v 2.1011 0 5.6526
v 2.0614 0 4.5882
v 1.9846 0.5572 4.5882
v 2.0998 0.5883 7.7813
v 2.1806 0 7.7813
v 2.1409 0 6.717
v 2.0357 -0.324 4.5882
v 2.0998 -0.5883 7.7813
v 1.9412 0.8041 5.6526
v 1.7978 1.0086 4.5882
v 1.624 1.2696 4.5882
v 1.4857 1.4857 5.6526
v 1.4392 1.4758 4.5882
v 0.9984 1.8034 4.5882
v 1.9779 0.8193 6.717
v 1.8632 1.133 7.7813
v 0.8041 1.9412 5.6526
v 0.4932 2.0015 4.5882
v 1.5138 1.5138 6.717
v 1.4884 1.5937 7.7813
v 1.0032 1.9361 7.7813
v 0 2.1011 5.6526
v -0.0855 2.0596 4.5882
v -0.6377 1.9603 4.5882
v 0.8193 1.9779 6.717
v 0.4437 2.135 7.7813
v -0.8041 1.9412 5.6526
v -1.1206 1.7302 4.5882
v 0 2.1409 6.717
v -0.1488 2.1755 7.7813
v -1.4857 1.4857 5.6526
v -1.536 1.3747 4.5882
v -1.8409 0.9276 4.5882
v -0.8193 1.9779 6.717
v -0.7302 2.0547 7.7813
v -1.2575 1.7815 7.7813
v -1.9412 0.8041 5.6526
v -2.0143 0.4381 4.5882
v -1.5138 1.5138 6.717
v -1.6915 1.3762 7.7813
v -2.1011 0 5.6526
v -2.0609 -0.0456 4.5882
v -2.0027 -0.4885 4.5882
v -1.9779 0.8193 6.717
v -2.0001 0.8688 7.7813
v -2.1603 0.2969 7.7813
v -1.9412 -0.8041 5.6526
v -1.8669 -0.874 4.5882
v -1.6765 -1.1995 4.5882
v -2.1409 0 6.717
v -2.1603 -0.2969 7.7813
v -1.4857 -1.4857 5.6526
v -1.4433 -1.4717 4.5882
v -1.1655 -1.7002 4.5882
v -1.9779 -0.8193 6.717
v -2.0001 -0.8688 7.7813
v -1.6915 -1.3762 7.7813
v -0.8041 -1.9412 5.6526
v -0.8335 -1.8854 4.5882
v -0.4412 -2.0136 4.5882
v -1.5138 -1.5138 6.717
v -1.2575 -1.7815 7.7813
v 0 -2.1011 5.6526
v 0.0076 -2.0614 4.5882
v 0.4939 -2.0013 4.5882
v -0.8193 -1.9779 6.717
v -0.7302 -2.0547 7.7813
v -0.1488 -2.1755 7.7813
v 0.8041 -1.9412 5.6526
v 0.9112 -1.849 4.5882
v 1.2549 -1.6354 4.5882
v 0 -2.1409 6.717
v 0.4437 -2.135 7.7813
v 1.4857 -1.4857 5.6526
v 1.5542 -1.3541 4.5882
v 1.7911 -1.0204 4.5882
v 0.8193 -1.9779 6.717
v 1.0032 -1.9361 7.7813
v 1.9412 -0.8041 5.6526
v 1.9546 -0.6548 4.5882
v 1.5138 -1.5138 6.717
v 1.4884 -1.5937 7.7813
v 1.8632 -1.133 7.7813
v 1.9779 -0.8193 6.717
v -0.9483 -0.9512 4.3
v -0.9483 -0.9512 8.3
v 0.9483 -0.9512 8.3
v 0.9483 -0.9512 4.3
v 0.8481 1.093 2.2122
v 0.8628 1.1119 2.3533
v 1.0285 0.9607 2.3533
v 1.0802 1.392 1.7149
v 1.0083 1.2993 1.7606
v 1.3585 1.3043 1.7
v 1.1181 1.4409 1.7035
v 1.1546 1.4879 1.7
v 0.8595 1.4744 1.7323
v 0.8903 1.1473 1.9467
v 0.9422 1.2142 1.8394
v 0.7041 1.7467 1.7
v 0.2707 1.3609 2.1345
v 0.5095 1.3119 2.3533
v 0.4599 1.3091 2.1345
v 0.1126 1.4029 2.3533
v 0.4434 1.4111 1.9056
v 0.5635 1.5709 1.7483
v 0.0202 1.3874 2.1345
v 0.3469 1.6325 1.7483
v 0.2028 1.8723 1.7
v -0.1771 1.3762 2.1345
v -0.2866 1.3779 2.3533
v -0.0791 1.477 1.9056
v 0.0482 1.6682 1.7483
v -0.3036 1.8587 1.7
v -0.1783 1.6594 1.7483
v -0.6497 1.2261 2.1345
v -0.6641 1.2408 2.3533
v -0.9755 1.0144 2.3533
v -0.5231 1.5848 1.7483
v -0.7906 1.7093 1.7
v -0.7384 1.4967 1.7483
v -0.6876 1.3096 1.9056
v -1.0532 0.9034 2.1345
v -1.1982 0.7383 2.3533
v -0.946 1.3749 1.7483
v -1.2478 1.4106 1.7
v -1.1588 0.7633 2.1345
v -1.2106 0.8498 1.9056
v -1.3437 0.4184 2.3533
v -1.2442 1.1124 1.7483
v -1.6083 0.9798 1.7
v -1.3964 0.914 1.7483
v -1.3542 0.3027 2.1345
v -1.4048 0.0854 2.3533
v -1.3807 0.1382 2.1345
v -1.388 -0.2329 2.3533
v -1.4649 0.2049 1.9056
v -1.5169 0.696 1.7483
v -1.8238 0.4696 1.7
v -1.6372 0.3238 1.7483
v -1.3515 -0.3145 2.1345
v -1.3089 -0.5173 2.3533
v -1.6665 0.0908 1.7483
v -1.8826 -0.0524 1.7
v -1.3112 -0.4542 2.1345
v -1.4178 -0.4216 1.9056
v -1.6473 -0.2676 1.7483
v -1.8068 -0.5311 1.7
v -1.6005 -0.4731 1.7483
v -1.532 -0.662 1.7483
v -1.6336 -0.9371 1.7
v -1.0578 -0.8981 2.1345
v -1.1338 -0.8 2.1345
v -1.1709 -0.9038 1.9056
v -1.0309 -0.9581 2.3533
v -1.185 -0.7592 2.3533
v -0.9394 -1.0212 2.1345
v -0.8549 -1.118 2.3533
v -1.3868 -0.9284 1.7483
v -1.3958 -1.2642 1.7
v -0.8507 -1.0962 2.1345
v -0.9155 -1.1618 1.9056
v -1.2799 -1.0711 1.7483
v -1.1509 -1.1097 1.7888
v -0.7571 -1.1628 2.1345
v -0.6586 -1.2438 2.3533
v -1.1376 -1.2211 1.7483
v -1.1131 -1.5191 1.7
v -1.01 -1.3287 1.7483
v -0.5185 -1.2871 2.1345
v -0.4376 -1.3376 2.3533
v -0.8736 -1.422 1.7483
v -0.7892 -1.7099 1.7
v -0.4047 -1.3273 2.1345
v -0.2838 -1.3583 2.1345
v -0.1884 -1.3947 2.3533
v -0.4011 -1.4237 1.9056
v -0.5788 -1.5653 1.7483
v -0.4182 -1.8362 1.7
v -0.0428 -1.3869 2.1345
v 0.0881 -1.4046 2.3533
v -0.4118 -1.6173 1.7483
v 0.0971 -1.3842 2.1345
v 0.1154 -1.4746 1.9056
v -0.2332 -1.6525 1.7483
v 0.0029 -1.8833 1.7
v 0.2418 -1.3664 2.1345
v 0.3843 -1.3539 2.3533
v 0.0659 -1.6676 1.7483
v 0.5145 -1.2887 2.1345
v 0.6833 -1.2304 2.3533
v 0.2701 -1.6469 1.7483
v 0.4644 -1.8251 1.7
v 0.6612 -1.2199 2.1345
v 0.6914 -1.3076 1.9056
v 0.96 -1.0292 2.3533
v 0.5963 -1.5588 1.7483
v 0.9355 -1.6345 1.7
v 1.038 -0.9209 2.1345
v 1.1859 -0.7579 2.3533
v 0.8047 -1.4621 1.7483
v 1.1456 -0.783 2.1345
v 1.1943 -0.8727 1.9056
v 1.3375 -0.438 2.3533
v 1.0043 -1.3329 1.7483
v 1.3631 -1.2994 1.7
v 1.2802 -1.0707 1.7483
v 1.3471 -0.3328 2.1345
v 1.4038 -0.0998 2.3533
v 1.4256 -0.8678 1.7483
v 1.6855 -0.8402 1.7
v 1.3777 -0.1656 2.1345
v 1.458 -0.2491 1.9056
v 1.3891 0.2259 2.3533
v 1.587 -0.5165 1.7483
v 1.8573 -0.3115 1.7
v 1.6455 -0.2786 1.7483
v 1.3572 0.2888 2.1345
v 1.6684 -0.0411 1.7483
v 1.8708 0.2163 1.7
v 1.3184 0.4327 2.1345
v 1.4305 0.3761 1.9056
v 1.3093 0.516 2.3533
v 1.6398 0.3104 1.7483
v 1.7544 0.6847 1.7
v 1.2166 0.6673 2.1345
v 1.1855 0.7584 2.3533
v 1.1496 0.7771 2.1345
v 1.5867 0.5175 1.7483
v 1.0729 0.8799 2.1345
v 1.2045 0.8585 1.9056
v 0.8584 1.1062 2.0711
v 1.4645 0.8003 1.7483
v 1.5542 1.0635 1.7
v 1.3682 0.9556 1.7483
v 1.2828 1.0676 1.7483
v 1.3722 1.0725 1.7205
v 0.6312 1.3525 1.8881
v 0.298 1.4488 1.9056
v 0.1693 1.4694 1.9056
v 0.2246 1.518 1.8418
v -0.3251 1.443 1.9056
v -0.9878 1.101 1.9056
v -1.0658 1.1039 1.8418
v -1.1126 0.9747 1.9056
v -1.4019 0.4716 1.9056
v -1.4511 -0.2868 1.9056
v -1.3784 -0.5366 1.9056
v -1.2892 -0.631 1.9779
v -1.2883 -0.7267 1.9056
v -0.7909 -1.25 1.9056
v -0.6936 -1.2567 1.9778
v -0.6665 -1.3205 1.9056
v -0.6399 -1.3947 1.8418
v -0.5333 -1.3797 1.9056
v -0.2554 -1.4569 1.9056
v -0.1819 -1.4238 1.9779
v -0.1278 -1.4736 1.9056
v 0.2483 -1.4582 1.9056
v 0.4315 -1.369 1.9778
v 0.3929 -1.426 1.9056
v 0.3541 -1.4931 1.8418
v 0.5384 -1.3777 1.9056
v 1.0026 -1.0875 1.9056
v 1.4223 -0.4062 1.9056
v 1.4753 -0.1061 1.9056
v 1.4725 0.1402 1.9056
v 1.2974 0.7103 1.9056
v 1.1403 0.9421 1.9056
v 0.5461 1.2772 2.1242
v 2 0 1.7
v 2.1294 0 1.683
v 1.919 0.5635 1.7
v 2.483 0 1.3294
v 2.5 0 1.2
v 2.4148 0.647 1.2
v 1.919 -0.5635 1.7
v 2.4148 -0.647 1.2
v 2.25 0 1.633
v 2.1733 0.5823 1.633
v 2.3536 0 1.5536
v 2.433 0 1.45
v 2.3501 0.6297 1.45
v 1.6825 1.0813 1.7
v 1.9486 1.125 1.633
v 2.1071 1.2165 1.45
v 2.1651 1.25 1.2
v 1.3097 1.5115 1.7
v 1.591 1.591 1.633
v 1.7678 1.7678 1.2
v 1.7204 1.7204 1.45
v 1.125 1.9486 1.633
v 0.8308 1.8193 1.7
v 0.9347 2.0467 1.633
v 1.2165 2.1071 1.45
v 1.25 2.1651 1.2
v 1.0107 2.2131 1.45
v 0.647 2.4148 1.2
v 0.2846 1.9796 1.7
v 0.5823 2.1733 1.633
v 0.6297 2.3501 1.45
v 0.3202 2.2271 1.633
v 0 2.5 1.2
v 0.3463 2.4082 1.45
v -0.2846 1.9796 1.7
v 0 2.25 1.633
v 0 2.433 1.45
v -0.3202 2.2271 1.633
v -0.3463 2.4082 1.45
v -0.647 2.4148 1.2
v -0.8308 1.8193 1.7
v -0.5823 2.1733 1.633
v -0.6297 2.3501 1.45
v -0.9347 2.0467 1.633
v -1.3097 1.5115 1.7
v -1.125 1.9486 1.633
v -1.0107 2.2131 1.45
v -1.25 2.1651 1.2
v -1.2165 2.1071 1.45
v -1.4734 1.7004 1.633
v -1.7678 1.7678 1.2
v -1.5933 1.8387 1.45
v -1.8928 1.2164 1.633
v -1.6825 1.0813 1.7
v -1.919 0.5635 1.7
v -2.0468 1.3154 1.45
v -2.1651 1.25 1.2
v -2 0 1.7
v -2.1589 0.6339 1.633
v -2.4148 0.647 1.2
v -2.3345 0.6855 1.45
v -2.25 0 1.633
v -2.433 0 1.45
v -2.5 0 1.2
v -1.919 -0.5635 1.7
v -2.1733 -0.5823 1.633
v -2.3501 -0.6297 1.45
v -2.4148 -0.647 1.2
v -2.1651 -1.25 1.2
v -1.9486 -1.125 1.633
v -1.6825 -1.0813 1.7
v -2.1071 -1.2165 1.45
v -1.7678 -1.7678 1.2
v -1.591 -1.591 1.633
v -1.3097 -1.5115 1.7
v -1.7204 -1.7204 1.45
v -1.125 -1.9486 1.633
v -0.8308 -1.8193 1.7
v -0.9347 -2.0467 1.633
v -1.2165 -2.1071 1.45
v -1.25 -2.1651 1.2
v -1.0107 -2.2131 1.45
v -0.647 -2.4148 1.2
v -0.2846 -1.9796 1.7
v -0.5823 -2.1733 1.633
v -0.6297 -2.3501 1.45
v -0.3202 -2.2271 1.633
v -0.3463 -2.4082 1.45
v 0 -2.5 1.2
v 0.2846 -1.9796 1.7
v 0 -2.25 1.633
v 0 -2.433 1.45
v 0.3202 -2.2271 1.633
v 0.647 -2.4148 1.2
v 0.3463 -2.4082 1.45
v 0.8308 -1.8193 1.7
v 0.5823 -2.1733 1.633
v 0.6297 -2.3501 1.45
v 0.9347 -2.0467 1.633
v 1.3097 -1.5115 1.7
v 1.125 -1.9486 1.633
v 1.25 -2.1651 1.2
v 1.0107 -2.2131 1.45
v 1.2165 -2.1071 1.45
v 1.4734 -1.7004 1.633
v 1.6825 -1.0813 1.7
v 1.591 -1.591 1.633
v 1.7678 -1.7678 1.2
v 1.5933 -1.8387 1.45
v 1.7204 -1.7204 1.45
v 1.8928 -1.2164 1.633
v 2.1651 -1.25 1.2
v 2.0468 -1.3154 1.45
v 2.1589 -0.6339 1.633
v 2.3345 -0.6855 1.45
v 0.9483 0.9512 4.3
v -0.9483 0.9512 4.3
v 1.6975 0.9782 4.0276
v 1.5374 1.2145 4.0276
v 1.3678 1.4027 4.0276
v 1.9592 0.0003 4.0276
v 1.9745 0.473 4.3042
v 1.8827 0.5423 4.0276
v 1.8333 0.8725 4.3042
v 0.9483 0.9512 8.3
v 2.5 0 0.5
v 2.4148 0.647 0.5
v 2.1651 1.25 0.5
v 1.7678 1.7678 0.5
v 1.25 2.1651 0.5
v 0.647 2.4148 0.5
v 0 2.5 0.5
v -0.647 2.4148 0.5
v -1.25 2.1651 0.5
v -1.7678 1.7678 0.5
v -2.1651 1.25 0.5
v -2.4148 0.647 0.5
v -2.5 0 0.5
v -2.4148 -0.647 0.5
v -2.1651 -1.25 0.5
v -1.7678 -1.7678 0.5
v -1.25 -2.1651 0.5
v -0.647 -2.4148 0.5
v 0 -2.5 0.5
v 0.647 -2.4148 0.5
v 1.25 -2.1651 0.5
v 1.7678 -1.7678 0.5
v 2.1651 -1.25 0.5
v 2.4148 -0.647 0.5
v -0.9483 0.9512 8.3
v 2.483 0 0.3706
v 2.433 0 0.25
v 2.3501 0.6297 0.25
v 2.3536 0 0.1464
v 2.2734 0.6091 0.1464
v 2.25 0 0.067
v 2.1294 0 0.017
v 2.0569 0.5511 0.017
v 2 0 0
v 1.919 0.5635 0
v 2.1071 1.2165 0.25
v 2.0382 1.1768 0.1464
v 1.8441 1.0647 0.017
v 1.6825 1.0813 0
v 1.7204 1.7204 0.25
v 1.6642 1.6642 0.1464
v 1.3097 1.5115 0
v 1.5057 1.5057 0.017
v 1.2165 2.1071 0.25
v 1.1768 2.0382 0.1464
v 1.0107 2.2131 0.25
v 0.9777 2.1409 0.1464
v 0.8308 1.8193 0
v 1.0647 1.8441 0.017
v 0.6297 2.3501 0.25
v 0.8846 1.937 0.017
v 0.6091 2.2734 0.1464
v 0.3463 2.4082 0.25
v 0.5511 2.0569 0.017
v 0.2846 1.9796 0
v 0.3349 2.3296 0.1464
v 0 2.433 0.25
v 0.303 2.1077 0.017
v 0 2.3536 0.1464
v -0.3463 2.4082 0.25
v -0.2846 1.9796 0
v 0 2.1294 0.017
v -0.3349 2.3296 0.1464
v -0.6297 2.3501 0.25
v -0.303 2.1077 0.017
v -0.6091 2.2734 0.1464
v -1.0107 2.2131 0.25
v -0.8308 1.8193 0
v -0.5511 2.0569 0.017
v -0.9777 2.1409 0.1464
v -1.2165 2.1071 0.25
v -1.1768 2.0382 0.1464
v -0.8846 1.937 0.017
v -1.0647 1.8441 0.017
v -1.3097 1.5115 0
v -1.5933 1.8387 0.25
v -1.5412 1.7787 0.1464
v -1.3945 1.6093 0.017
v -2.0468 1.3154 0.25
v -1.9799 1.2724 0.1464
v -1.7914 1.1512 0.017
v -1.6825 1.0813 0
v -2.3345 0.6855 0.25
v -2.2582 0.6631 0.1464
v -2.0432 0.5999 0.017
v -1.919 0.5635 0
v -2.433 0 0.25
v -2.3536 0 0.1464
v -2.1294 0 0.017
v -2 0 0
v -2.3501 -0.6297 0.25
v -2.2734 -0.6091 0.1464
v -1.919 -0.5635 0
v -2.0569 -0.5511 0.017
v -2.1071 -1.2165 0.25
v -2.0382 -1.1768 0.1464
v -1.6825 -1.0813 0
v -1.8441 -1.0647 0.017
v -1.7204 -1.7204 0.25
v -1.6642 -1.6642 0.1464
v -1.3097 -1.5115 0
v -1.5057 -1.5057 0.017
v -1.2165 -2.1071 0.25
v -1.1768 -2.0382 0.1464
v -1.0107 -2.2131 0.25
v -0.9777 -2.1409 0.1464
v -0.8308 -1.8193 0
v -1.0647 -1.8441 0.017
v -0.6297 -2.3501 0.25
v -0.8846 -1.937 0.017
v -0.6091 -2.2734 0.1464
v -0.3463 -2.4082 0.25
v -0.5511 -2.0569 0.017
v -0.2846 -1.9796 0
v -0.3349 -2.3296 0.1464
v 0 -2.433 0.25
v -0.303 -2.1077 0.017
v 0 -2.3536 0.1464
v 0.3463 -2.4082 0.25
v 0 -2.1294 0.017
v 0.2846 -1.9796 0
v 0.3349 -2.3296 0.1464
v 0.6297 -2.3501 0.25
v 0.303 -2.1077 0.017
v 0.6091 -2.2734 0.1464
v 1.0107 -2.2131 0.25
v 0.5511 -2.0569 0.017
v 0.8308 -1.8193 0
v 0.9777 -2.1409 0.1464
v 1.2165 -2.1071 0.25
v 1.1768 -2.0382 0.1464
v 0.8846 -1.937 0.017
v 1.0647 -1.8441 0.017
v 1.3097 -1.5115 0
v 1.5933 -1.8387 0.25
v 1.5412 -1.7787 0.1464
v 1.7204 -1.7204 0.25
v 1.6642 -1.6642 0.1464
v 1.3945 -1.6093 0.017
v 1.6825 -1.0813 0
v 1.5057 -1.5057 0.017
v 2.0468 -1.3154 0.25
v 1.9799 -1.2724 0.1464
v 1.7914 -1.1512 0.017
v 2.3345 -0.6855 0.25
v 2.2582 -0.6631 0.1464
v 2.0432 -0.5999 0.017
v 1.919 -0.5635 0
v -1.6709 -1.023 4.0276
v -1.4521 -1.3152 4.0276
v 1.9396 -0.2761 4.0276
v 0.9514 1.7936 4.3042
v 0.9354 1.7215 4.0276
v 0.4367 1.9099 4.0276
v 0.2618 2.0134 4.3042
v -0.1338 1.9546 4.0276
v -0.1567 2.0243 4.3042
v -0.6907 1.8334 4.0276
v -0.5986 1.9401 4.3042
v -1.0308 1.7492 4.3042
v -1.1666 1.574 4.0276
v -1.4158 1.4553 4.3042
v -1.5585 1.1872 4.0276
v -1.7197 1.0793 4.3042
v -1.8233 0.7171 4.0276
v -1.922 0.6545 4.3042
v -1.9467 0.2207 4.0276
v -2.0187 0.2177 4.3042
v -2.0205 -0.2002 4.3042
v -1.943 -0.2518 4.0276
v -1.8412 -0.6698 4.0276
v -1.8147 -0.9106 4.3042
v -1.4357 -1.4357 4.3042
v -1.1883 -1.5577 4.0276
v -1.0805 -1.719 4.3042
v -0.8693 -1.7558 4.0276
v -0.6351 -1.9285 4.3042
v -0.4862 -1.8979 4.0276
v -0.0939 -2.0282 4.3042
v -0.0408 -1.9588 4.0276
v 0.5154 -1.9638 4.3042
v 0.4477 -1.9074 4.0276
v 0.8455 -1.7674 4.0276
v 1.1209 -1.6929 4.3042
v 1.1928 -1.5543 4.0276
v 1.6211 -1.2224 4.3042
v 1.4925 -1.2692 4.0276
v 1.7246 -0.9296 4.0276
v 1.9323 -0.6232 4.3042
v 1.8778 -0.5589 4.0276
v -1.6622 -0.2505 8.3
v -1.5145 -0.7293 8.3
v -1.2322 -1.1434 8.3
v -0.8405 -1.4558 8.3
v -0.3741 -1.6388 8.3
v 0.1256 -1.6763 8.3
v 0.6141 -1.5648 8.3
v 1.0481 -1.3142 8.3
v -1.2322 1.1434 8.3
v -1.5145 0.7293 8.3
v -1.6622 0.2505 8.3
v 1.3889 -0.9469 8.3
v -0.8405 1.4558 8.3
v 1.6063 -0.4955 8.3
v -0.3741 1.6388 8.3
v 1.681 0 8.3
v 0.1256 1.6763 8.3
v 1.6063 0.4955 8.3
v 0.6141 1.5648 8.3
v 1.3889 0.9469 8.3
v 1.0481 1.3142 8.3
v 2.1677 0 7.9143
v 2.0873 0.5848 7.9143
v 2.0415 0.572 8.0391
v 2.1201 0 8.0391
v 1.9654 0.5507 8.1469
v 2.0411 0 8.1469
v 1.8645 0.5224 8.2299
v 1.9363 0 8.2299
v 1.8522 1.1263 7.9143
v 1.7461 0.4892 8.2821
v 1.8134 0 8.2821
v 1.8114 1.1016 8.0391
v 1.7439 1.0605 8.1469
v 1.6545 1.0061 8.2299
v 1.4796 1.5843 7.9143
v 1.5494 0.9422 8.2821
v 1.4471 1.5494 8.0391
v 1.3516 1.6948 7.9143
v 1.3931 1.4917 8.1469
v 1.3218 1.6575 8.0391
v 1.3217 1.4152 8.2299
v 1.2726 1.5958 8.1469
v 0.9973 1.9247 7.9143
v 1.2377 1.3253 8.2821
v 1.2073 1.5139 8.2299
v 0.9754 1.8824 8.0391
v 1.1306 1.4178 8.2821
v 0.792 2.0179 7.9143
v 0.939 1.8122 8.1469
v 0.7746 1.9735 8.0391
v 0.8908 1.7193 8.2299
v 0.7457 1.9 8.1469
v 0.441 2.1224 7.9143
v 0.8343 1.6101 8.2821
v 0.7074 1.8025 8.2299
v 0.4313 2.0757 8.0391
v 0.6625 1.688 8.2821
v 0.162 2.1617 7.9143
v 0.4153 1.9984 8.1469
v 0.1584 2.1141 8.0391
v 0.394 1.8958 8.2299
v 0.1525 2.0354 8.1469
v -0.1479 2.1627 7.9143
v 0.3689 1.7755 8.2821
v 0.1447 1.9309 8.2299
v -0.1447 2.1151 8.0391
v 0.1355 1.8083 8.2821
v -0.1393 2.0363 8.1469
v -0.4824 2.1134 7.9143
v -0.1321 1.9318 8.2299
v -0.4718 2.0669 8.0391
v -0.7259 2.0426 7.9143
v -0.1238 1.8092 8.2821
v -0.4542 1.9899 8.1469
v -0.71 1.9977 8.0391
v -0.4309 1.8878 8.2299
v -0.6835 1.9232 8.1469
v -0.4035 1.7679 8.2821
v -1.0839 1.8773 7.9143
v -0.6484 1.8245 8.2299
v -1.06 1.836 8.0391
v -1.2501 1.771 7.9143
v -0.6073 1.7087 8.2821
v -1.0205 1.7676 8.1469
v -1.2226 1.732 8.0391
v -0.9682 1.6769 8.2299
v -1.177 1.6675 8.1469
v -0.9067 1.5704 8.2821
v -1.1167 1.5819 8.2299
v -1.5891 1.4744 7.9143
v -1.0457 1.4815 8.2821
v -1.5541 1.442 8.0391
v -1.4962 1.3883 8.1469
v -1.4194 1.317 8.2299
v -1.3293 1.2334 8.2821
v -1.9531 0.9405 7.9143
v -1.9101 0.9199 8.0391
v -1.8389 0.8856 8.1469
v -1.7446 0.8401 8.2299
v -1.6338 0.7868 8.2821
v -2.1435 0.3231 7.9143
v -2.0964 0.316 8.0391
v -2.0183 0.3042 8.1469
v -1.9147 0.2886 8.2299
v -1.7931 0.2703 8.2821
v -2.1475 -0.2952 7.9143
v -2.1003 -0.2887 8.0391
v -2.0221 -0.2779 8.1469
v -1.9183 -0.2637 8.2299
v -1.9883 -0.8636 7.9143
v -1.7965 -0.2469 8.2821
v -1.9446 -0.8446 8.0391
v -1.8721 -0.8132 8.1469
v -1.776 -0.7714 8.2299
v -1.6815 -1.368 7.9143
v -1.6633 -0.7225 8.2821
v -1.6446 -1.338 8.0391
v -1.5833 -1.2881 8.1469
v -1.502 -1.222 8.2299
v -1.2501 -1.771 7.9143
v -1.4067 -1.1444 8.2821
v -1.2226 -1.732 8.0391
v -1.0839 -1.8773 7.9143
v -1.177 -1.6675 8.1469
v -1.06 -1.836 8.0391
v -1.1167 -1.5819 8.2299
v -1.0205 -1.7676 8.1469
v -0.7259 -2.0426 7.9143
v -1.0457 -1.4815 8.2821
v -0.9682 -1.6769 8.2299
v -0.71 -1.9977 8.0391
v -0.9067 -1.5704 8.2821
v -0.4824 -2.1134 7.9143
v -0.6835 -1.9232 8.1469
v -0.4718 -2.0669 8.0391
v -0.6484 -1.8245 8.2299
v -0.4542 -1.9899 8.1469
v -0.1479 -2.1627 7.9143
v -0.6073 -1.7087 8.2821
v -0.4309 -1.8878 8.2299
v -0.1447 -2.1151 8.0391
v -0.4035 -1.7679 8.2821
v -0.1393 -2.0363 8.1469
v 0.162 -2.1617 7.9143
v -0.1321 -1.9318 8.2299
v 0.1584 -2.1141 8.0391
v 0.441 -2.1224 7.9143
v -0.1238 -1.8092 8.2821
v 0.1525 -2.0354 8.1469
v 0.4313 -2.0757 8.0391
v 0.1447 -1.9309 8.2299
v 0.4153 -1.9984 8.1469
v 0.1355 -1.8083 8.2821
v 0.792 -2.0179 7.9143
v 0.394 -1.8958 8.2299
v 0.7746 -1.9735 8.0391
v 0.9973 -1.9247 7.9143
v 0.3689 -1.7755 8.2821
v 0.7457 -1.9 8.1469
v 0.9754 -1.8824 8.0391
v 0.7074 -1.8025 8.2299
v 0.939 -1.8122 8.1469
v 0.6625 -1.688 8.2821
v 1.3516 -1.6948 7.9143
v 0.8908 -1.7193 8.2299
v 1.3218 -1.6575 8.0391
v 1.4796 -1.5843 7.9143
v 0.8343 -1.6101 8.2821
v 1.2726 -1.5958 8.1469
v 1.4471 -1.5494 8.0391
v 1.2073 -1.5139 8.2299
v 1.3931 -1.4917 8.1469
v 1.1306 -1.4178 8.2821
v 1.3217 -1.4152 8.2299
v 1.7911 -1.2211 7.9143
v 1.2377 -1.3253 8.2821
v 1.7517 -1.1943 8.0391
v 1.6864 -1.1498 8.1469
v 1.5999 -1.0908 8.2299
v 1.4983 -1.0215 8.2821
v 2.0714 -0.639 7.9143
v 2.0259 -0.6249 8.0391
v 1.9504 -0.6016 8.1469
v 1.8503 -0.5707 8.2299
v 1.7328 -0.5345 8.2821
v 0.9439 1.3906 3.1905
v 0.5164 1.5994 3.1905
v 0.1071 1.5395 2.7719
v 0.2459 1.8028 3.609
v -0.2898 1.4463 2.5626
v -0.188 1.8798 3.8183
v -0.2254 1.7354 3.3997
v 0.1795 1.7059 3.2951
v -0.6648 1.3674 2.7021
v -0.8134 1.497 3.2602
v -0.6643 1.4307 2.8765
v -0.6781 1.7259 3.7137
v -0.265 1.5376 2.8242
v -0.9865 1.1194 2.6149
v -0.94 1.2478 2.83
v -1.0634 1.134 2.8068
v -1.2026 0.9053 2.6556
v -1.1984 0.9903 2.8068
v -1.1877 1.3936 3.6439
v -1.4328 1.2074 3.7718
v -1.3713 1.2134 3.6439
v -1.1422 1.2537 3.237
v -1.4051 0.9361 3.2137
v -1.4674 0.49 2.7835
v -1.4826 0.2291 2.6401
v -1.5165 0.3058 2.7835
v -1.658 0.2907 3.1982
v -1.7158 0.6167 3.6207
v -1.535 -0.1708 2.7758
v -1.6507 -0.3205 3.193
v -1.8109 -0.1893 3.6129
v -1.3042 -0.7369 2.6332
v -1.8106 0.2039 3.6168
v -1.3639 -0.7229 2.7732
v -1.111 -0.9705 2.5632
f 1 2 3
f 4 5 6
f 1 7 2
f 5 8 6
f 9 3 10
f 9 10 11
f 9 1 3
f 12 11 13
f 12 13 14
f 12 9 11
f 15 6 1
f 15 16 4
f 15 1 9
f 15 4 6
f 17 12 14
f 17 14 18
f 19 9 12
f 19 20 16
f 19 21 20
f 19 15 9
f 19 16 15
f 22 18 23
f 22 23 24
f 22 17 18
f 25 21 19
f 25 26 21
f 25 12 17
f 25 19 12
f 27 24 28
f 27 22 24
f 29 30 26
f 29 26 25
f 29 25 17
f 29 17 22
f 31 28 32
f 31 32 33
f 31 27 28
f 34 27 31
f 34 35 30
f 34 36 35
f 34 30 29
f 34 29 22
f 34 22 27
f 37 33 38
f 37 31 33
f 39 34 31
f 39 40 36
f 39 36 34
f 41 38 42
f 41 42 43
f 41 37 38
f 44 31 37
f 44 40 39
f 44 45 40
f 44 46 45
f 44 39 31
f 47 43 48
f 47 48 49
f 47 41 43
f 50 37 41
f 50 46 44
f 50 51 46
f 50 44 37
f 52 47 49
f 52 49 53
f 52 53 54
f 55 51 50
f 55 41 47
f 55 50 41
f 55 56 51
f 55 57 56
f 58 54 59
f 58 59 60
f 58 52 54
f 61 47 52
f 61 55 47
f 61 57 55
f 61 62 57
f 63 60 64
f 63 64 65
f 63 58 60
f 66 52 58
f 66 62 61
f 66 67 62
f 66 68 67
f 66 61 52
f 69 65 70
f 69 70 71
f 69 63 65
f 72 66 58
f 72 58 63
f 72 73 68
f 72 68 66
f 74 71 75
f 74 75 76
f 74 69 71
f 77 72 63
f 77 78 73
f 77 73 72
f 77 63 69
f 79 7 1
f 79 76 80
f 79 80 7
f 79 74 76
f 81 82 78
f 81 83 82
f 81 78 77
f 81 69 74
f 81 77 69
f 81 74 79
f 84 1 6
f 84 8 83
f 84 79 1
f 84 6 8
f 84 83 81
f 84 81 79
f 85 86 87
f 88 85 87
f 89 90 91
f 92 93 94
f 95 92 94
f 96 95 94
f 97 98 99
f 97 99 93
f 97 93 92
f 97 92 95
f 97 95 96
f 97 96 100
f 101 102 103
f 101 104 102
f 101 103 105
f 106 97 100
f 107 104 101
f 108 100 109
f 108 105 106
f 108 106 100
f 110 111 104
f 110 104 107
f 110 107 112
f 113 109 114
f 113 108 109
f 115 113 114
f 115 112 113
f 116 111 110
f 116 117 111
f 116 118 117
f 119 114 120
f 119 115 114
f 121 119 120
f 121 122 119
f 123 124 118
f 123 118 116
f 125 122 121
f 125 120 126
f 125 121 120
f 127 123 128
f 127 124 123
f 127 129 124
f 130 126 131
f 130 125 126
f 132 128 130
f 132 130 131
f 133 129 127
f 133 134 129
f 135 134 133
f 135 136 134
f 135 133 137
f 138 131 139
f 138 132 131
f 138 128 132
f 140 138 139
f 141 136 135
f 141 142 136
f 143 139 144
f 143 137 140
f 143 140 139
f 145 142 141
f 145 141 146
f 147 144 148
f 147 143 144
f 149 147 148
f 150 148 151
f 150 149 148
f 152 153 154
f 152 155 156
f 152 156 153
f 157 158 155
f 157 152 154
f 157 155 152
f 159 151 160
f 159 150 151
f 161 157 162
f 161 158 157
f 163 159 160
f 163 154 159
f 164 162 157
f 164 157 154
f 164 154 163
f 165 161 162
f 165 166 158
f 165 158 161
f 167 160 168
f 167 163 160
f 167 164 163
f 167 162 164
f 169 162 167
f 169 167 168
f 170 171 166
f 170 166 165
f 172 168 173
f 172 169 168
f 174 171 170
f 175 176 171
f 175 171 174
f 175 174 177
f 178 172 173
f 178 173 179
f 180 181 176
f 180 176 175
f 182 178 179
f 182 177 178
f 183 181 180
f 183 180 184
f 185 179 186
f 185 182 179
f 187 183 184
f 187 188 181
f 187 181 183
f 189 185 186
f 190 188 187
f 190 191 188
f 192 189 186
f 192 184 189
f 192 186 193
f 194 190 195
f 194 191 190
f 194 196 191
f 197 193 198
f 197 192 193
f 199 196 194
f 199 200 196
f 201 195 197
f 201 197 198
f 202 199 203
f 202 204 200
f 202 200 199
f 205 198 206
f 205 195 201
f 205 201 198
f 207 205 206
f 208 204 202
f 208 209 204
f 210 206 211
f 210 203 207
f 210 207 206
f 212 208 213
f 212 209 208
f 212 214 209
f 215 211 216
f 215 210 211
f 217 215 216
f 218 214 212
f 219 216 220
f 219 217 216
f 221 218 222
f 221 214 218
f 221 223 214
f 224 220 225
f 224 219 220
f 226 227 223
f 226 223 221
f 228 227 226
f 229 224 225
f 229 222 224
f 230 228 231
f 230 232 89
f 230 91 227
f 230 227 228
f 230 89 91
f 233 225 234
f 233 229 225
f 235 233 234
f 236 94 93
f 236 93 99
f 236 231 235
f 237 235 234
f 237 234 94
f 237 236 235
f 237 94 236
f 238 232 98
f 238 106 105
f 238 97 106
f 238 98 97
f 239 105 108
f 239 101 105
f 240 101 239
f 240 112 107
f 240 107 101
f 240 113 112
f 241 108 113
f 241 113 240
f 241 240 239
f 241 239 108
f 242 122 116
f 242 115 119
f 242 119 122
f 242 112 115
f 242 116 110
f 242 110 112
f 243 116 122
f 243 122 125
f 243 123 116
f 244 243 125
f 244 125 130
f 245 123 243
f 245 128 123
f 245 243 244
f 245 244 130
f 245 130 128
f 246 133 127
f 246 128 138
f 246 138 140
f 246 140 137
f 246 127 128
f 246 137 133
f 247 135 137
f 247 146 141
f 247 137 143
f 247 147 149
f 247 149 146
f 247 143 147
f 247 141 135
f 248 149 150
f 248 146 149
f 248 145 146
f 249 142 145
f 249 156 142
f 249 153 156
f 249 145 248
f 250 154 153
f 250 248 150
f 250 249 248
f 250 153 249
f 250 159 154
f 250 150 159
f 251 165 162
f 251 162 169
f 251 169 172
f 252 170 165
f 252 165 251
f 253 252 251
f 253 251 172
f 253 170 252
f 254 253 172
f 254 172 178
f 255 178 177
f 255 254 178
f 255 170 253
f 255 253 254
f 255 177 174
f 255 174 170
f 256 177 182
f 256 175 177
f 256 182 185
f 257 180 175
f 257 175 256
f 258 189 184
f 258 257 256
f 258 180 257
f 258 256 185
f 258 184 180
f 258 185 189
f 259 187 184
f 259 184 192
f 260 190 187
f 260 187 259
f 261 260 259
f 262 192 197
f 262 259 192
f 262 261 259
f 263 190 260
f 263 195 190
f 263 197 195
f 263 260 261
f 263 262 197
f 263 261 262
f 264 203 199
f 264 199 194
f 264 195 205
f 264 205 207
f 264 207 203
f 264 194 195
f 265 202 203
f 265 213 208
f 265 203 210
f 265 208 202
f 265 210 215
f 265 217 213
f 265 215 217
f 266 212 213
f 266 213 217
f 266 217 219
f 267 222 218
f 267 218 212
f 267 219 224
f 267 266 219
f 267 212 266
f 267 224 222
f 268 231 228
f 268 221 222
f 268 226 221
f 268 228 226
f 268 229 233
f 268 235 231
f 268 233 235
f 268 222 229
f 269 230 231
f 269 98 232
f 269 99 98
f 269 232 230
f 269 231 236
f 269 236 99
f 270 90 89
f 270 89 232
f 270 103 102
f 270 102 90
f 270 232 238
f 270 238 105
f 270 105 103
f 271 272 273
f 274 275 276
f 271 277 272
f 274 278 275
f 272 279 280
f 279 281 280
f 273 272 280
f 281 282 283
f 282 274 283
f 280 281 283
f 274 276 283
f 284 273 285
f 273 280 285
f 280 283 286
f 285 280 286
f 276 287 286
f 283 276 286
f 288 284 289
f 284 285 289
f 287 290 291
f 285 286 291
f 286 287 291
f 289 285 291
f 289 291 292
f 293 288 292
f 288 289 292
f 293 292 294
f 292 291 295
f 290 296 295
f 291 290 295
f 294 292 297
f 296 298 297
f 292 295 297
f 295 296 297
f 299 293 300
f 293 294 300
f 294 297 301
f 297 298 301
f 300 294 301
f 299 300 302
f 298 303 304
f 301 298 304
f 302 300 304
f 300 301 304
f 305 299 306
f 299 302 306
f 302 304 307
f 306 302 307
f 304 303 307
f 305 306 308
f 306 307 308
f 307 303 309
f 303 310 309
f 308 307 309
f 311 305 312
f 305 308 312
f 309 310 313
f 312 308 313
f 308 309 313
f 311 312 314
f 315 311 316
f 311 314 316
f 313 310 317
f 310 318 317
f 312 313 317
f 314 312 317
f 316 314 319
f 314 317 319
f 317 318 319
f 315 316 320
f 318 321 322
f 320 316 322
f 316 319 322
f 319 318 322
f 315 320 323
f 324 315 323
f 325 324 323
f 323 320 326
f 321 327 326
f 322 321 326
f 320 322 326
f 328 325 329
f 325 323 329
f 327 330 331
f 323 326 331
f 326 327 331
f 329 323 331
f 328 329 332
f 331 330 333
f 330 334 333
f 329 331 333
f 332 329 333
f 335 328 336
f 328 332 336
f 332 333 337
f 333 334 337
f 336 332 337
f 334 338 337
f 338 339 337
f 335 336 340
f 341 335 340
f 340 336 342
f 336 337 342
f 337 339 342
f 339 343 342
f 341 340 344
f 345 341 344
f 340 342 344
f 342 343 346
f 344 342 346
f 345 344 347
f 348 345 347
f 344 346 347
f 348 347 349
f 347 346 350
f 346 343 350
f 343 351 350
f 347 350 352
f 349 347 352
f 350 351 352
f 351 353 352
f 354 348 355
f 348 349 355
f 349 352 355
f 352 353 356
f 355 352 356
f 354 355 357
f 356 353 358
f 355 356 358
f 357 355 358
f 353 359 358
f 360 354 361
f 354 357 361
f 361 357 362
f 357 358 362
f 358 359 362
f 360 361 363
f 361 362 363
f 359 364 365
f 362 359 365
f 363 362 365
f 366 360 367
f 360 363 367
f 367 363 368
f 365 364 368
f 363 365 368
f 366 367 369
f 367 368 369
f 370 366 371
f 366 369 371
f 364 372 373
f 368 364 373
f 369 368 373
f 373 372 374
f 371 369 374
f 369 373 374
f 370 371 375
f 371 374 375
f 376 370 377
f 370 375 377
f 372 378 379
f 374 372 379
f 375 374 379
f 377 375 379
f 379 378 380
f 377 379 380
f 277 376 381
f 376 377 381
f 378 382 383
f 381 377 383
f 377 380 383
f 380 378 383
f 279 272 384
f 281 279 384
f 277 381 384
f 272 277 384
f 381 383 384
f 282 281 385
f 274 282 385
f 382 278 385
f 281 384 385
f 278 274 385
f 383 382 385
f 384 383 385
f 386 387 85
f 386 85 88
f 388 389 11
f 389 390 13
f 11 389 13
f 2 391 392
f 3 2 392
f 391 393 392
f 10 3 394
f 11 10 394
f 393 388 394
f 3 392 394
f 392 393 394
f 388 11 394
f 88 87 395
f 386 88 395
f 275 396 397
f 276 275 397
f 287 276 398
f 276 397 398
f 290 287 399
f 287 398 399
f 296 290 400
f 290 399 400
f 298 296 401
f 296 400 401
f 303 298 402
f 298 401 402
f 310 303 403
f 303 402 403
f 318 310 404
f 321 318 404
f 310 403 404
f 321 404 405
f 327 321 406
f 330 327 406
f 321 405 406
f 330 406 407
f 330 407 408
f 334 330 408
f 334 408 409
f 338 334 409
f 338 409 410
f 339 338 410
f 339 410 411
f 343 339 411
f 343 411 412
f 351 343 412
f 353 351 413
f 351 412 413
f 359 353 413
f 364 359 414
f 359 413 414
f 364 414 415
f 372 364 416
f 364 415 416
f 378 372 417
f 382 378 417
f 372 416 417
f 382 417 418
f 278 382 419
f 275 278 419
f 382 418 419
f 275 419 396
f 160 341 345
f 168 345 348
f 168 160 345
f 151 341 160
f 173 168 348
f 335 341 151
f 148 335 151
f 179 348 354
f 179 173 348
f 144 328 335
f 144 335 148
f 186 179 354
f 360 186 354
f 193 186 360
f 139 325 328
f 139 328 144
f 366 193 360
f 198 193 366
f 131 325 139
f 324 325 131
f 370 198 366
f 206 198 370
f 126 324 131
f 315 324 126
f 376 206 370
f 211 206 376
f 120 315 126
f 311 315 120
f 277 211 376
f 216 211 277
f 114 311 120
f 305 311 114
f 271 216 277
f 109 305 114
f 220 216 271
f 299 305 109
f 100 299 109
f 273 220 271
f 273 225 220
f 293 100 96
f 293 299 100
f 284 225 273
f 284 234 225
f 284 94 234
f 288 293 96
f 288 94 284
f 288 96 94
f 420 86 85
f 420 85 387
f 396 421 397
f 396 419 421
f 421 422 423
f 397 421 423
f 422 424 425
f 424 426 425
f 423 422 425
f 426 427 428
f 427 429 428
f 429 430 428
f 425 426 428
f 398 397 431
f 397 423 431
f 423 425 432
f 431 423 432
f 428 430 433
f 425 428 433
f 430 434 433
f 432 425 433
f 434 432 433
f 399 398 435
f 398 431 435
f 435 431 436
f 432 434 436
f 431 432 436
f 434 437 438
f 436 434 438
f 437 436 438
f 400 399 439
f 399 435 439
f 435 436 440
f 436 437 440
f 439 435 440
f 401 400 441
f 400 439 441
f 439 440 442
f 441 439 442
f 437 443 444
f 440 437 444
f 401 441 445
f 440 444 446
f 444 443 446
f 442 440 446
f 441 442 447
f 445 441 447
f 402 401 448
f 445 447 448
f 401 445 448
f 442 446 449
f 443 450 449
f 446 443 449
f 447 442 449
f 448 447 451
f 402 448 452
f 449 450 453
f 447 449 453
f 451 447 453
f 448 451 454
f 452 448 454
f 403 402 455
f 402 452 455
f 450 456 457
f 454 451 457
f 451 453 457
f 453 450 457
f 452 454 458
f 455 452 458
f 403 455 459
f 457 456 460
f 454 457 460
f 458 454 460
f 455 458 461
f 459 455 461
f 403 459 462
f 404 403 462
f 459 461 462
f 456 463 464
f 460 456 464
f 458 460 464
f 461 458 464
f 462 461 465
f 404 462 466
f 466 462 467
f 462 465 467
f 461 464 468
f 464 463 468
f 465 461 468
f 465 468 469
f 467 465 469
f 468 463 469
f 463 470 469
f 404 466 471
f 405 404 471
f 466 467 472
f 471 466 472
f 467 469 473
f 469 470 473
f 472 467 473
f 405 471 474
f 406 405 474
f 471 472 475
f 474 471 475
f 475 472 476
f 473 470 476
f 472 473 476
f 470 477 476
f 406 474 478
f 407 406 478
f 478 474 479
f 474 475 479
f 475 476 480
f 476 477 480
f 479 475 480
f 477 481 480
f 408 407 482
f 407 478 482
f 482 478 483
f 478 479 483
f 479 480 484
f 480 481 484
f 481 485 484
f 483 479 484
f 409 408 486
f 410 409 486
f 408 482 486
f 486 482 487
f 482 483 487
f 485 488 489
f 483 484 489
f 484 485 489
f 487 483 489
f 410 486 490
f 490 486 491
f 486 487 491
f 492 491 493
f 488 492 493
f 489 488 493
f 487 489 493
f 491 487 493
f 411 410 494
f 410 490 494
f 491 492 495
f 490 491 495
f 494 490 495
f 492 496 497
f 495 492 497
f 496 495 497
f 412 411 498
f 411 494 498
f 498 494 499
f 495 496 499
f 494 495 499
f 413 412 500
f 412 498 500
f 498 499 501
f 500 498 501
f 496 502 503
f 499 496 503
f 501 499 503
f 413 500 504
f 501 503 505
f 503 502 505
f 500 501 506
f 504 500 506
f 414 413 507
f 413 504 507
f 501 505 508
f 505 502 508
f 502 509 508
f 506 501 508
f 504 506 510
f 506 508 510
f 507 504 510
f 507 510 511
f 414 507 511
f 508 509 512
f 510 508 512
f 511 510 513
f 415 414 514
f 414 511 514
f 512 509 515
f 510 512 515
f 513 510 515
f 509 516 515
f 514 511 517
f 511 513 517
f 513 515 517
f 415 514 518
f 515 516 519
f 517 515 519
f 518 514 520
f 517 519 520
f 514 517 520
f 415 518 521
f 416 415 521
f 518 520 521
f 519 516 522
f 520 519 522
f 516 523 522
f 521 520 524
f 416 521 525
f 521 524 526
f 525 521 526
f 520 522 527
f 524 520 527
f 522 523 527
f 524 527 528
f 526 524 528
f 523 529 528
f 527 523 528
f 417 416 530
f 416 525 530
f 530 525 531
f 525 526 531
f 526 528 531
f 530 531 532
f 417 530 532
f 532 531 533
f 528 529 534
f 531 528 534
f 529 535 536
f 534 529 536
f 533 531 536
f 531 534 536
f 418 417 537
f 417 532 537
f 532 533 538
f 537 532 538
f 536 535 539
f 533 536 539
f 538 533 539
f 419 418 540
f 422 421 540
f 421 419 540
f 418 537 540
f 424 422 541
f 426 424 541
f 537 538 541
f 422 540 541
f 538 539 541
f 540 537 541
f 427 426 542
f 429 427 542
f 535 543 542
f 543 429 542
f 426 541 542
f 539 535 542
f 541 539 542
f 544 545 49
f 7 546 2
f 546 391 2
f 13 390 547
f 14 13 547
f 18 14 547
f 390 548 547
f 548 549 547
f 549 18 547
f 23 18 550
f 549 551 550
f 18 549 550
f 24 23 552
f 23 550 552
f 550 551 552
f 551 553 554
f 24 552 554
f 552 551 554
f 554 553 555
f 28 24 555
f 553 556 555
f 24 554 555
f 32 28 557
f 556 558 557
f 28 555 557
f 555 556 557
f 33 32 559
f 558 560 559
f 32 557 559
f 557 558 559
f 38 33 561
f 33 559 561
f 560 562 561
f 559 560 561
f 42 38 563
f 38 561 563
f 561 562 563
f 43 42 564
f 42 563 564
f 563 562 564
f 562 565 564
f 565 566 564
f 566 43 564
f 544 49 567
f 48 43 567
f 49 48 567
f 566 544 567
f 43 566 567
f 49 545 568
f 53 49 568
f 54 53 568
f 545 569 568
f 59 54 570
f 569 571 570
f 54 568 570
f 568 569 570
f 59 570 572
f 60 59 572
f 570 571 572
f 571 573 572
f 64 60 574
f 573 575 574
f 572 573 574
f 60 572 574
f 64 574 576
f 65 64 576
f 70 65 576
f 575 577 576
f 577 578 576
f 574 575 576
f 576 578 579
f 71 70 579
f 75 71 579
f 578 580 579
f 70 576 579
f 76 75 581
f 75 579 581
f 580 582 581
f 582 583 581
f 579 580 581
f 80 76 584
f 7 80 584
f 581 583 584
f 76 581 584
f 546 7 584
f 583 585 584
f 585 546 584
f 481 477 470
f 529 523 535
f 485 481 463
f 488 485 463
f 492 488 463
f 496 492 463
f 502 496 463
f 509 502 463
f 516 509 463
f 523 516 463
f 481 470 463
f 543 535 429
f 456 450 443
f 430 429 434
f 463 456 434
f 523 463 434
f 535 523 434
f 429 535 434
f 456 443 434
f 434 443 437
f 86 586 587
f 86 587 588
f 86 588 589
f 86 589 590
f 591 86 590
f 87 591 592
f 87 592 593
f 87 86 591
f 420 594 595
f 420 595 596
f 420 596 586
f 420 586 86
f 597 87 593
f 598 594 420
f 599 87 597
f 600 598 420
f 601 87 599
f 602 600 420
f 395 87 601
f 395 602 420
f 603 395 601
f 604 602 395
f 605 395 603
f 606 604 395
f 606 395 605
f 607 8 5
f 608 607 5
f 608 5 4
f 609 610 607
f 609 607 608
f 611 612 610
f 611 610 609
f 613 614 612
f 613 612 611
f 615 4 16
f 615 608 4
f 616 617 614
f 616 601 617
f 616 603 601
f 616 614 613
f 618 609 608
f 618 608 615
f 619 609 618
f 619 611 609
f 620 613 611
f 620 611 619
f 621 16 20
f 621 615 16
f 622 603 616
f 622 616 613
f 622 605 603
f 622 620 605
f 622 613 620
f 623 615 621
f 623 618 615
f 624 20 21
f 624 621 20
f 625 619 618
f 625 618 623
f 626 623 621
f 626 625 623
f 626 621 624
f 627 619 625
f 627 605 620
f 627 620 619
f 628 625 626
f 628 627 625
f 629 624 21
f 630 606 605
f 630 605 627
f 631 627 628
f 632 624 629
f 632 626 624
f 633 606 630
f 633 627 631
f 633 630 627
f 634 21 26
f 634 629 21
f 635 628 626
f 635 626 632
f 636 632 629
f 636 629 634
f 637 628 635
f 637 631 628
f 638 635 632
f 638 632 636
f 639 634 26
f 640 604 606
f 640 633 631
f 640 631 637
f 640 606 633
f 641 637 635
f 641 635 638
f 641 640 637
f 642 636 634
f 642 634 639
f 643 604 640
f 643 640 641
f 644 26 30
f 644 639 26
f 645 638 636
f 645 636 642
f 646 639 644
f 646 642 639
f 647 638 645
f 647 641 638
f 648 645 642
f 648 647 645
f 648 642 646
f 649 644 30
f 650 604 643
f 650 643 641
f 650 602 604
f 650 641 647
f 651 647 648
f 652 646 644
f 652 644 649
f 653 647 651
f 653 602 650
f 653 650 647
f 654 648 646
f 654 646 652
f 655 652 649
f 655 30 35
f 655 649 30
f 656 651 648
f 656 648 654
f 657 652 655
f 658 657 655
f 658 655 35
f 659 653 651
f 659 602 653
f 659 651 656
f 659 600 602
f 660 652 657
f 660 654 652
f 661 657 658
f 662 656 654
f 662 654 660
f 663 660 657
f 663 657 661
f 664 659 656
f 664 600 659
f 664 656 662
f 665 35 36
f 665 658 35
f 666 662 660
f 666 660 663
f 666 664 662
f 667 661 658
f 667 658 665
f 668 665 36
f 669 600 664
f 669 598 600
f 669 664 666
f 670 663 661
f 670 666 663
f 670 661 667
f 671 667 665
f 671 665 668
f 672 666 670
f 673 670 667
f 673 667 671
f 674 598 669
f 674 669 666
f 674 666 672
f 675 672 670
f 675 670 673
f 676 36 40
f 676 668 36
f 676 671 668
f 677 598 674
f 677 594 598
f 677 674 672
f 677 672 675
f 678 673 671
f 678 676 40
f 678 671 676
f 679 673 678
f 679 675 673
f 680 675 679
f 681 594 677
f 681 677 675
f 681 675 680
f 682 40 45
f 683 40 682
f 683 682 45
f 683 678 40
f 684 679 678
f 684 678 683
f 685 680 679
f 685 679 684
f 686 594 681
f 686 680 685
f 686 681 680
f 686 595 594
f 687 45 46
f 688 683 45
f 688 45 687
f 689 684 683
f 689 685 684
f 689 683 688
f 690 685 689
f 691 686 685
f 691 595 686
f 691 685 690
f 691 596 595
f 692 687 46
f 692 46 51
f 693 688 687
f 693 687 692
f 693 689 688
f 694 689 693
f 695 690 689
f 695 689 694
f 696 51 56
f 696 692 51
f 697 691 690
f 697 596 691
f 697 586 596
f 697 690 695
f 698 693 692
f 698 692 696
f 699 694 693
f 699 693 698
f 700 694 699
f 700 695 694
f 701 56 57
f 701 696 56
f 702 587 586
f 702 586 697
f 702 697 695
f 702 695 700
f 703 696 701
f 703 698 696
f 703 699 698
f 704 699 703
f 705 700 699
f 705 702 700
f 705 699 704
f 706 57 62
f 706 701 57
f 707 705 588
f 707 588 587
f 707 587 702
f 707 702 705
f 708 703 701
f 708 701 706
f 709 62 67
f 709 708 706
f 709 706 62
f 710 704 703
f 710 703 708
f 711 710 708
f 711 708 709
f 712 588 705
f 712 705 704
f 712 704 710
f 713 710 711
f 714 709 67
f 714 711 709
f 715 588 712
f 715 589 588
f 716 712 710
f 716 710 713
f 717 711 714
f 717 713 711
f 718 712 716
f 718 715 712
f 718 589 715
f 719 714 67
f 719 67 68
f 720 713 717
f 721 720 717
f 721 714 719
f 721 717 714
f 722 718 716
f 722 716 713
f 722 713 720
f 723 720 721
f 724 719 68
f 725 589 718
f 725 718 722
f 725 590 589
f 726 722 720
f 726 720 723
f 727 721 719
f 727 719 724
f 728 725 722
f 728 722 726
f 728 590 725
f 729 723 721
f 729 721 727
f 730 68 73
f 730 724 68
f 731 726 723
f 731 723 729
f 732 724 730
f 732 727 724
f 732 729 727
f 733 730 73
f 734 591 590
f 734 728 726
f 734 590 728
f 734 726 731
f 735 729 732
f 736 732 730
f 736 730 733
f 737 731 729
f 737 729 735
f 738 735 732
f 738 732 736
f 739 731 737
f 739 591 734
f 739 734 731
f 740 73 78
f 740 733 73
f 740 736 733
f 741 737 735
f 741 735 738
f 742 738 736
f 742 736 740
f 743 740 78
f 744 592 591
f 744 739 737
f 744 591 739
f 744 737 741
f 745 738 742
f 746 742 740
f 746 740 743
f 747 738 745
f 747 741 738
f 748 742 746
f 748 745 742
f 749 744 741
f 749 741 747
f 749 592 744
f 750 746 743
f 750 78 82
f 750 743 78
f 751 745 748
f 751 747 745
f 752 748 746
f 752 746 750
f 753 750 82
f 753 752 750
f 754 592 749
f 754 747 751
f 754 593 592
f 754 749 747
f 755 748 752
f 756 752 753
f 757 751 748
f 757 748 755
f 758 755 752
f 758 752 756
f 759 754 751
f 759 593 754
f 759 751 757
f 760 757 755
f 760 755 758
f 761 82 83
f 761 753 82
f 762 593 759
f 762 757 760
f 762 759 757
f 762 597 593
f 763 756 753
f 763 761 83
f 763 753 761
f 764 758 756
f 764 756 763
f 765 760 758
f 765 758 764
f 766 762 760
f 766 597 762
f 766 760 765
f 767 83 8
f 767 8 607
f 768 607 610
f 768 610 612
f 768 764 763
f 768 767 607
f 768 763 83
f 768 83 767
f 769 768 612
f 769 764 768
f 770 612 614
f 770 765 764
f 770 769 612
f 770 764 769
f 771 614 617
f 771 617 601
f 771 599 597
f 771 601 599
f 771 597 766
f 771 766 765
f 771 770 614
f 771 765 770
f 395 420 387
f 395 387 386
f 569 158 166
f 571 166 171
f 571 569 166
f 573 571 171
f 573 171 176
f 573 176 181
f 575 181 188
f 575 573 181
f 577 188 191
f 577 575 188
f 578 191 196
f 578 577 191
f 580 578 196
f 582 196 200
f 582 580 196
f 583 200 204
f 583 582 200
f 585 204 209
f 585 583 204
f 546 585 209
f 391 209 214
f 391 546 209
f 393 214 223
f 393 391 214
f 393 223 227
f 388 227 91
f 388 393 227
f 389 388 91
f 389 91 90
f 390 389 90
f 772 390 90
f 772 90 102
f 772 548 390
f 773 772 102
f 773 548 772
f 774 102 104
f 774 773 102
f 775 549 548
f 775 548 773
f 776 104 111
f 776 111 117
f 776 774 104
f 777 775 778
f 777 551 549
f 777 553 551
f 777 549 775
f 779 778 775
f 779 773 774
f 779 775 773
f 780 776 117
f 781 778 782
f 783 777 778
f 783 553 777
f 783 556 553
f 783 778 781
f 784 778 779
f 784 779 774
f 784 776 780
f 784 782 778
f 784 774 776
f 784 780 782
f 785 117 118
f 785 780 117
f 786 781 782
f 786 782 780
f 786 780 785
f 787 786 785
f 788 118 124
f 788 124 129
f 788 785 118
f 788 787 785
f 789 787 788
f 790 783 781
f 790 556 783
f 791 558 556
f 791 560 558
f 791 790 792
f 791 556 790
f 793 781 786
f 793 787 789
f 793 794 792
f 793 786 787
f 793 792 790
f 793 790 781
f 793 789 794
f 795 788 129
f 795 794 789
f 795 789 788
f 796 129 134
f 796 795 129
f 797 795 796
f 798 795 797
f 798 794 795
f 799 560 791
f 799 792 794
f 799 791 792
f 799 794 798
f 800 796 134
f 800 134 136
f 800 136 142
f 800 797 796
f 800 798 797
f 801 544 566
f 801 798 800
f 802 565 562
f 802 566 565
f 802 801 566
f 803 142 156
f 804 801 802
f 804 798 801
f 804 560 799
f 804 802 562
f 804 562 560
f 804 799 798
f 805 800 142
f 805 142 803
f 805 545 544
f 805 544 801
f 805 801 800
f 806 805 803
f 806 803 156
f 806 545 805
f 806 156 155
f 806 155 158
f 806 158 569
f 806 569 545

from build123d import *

# Parameters (mm, degrees)
SKETCH_1_R          = 2.5
EXTRUDE_1_DEPTH     = 1.7
FILLET_7_R          = 0.5
SKETCH_7_R          = 2.050609665
SKETCH_8_R          = 2.2
SKETCH_10_W         = 1.896668422
SKETCH_10_H         = 1.902308834
CUT_EXTRUDE_1_DEPTH = 4
FILLET_13_R         = 0.5
FILLET_17_R         = 2
FILLET_18_R         = 0.5
FILLET_19_R         = 0.5


with BuildPart() as part:
    # 草图1 → 凸台-拉伸1 (new body)
    with BuildSketch(Plane.XY):
        Circle(SKETCH_1_R)
    extrude(amount=EXTRUDE_1_DEPTH)

    # 圆角7
    fillet_7_edges = [part.edges().sort_by_distance(p)[0] for p in [
        (-2.5, 0, 0),
    ]]
    fillet(fillet_7_edges, radius=FILLET_7_R)

    # 放样1: read off the stored shape, not the designer's step
    # 放样1: loft between two sections, ruled curve by curve
    loft_1_from = [
        Edge.make_bspline([(0.665743614, 0.998391427, 1.7), (-1.33103924, 2.329878654, 1.7), (-2.662526467, 0.333095801, 1.7), (-0.665743614, -0.998391427, 1.7), (1.33103924, -2.329878654, 1.7), (2.662526467, -0.333095801, 1.7), (0.665743614, 0.998391427, 1.7)], [0, 0, 0, 0, 0.5, 0.5, 0.5, 1, 1, 1, 1], 3, [1, 0.333333333, 0.333333333, 1, 0.333333333, 0.333333333, 1]),
    ]
    loft_1_to = [
        Edge.make_bspline([(1.45, 1.45, 4.3), (-1.45, 4.35, 4.3), (-4.35, 1.45, 4.3), (-1.45, -1.45, 4.3), (1.45, -4.35, 4.3), (4.35, -1.45, 4.3), (1.45, 1.45, 4.3)], [0, 0, 0, 0, 0.5, 0.5, 0.5, 1, 1, 1, 1], 3, [1, 0.333333333, 0.333333333, 1, 0.333333333, 0.333333333, 1]),
    ]
    loft_1 = Solid(Shell([*[Face.make_surface_from_curves(loft_1_from[k], loft_1_to[k]) for k in range(1)], Face(Wire(loft_1_from)), Face(Wire(loft_1_to))]))
    add(loft_1)

    # 草图7 → 放样3 section 0
    with BuildSketch(Plane.XY.offset(4.3)):
        Circle(SKETCH_7_R)
    # 草图8 → 放样3 section 1
    with BuildSketch(Plane.XY.offset(8.3)):
        Circle(SKETCH_8_R)
    loft()

    # 草图10 → 切除-拉伸1 (cut)
    with BuildSketch(Plane.XY.offset(8.3)):
        Rectangle(SKETCH_10_W, SKETCH_10_H)
    extrude(amount=-CUT_EXTRUDE_1_DEPTH, mode=Mode.SUBTRACT)

    # 圆角13
    fillet_13_edges = [part.edges().sort_by_distance(p)[0] for p in [
        (-2.5, 0, 1.7),
    ]]
    fillet(fillet_13_edges, radius=FILLET_13_R)

    # 圆角17
    fillet_17_edges = [part.edges().sort_by_distance(p)[0] for p in [
        (-1.894516299, -0.784734346, 4.3),
    ]]
    fillet(fillet_17_edges, radius=FILLET_17_R)

    # 圆角18
    fillet_18_edges = [part.edges().sort_by_distance(p)[0] for p in [
        (-0.665743614, -0.998391427, 1.7),
    ]]
    fillet(fillet_18_edges, radius=FILLET_18_R)

    # 圆角19
    fillet_19_edges = [part.edges().sort_by_distance(p)[0] for p in [
        (-2.2, 0, 8.3),
    ]]
    fillet(fillet_19_edges, radius=FILLET_19_R)


solid = part.part
